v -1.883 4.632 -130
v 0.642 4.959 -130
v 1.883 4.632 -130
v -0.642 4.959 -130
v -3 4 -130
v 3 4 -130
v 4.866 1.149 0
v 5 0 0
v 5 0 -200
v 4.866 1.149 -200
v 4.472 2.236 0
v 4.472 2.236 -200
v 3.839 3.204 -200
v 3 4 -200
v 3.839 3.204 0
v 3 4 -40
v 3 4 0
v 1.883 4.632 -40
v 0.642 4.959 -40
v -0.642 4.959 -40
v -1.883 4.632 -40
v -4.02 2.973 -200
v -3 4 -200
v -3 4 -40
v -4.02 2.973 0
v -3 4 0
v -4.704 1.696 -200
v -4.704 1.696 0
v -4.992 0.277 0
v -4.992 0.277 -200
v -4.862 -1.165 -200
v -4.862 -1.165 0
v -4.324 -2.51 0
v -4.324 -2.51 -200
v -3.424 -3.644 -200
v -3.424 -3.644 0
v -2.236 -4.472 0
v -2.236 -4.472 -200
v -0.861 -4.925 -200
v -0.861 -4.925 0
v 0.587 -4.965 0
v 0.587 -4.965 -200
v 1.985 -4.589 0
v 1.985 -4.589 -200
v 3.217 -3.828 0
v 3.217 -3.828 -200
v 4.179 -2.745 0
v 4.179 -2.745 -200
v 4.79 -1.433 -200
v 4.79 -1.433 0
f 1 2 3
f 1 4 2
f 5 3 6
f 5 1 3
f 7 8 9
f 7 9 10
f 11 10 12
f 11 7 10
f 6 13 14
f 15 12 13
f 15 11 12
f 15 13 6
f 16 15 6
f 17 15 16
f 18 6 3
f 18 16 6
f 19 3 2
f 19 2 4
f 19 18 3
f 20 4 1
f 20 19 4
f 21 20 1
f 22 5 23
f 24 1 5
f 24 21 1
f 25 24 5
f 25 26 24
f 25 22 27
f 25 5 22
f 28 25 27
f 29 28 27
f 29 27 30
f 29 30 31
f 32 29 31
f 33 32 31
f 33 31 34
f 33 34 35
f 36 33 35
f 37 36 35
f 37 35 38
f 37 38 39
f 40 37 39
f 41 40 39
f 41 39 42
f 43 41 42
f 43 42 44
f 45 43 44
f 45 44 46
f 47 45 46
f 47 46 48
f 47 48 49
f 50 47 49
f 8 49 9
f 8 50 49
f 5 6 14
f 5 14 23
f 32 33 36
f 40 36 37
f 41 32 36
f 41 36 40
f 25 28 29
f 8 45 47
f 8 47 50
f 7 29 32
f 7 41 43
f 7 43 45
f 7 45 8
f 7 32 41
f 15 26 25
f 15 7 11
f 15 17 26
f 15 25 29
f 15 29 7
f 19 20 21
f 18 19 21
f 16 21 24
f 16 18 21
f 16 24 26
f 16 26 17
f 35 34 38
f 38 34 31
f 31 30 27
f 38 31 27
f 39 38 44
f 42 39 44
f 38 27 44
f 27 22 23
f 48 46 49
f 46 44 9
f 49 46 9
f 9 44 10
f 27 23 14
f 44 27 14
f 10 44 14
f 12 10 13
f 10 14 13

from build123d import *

# Parameters (mm, degrees)
SKETCH1_R           = 5
SKETCH1_R_2         = 2.5
BOSS_EXTRUDE1_DEPTH = 200
SKETCH2_W           = 20
SKETCH2_H           = 2
CUT_EXTRUDE1_DEPTH  = 40
CUT_EXTRUDE2_START  = -70
SKETCH4_W           = 20
SKETCH4_H           = 2
CUT_EXTRUDE2_DEPTH  = 271.124960962


with BuildPart() as part:
    # Sketch1 → Boss-Extrude1 (new body)
    # profile 1 of 2: a face of its own
    with BuildSketch(Plane.XY):
        Circle(SKETCH1_R)
        Circle(SKETCH1_R_2, mode=Mode.SUBTRACT)
    # profile 2 of 2: a face of its own
    with BuildSketch(Plane.XY):
        Circle(SKETCH1_R_2)
    extrude(amount=-BOSS_EXTRUDE1_DEPTH)

    # Sketch2 → Cut-Extrude1 (cut)
    with BuildSketch(Plane.XY):
        with Locations((0, 5)):
            Rectangle(SKETCH2_W, SKETCH2_H)
    extrude(amount=-CUT_EXTRUDE1_DEPTH, mode=Mode.SUBTRACT)

    # Sketch4 → Cut-Extrude2 (cut, through all)
    with BuildSketch(Plane(origin=(0, 0, -200), x_dir=(-1, 0, 0), z_dir=(0, 0, -1)).offset(CUT_EXTRUDE2_START)):
        with Locations((0, 5)):
            Rectangle(SKETCH4_W, SKETCH4_H)
    extrude(amount=CUT_EXTRUDE2_DEPTH, mode=Mode.SUBTRACT)


solid = part.part
